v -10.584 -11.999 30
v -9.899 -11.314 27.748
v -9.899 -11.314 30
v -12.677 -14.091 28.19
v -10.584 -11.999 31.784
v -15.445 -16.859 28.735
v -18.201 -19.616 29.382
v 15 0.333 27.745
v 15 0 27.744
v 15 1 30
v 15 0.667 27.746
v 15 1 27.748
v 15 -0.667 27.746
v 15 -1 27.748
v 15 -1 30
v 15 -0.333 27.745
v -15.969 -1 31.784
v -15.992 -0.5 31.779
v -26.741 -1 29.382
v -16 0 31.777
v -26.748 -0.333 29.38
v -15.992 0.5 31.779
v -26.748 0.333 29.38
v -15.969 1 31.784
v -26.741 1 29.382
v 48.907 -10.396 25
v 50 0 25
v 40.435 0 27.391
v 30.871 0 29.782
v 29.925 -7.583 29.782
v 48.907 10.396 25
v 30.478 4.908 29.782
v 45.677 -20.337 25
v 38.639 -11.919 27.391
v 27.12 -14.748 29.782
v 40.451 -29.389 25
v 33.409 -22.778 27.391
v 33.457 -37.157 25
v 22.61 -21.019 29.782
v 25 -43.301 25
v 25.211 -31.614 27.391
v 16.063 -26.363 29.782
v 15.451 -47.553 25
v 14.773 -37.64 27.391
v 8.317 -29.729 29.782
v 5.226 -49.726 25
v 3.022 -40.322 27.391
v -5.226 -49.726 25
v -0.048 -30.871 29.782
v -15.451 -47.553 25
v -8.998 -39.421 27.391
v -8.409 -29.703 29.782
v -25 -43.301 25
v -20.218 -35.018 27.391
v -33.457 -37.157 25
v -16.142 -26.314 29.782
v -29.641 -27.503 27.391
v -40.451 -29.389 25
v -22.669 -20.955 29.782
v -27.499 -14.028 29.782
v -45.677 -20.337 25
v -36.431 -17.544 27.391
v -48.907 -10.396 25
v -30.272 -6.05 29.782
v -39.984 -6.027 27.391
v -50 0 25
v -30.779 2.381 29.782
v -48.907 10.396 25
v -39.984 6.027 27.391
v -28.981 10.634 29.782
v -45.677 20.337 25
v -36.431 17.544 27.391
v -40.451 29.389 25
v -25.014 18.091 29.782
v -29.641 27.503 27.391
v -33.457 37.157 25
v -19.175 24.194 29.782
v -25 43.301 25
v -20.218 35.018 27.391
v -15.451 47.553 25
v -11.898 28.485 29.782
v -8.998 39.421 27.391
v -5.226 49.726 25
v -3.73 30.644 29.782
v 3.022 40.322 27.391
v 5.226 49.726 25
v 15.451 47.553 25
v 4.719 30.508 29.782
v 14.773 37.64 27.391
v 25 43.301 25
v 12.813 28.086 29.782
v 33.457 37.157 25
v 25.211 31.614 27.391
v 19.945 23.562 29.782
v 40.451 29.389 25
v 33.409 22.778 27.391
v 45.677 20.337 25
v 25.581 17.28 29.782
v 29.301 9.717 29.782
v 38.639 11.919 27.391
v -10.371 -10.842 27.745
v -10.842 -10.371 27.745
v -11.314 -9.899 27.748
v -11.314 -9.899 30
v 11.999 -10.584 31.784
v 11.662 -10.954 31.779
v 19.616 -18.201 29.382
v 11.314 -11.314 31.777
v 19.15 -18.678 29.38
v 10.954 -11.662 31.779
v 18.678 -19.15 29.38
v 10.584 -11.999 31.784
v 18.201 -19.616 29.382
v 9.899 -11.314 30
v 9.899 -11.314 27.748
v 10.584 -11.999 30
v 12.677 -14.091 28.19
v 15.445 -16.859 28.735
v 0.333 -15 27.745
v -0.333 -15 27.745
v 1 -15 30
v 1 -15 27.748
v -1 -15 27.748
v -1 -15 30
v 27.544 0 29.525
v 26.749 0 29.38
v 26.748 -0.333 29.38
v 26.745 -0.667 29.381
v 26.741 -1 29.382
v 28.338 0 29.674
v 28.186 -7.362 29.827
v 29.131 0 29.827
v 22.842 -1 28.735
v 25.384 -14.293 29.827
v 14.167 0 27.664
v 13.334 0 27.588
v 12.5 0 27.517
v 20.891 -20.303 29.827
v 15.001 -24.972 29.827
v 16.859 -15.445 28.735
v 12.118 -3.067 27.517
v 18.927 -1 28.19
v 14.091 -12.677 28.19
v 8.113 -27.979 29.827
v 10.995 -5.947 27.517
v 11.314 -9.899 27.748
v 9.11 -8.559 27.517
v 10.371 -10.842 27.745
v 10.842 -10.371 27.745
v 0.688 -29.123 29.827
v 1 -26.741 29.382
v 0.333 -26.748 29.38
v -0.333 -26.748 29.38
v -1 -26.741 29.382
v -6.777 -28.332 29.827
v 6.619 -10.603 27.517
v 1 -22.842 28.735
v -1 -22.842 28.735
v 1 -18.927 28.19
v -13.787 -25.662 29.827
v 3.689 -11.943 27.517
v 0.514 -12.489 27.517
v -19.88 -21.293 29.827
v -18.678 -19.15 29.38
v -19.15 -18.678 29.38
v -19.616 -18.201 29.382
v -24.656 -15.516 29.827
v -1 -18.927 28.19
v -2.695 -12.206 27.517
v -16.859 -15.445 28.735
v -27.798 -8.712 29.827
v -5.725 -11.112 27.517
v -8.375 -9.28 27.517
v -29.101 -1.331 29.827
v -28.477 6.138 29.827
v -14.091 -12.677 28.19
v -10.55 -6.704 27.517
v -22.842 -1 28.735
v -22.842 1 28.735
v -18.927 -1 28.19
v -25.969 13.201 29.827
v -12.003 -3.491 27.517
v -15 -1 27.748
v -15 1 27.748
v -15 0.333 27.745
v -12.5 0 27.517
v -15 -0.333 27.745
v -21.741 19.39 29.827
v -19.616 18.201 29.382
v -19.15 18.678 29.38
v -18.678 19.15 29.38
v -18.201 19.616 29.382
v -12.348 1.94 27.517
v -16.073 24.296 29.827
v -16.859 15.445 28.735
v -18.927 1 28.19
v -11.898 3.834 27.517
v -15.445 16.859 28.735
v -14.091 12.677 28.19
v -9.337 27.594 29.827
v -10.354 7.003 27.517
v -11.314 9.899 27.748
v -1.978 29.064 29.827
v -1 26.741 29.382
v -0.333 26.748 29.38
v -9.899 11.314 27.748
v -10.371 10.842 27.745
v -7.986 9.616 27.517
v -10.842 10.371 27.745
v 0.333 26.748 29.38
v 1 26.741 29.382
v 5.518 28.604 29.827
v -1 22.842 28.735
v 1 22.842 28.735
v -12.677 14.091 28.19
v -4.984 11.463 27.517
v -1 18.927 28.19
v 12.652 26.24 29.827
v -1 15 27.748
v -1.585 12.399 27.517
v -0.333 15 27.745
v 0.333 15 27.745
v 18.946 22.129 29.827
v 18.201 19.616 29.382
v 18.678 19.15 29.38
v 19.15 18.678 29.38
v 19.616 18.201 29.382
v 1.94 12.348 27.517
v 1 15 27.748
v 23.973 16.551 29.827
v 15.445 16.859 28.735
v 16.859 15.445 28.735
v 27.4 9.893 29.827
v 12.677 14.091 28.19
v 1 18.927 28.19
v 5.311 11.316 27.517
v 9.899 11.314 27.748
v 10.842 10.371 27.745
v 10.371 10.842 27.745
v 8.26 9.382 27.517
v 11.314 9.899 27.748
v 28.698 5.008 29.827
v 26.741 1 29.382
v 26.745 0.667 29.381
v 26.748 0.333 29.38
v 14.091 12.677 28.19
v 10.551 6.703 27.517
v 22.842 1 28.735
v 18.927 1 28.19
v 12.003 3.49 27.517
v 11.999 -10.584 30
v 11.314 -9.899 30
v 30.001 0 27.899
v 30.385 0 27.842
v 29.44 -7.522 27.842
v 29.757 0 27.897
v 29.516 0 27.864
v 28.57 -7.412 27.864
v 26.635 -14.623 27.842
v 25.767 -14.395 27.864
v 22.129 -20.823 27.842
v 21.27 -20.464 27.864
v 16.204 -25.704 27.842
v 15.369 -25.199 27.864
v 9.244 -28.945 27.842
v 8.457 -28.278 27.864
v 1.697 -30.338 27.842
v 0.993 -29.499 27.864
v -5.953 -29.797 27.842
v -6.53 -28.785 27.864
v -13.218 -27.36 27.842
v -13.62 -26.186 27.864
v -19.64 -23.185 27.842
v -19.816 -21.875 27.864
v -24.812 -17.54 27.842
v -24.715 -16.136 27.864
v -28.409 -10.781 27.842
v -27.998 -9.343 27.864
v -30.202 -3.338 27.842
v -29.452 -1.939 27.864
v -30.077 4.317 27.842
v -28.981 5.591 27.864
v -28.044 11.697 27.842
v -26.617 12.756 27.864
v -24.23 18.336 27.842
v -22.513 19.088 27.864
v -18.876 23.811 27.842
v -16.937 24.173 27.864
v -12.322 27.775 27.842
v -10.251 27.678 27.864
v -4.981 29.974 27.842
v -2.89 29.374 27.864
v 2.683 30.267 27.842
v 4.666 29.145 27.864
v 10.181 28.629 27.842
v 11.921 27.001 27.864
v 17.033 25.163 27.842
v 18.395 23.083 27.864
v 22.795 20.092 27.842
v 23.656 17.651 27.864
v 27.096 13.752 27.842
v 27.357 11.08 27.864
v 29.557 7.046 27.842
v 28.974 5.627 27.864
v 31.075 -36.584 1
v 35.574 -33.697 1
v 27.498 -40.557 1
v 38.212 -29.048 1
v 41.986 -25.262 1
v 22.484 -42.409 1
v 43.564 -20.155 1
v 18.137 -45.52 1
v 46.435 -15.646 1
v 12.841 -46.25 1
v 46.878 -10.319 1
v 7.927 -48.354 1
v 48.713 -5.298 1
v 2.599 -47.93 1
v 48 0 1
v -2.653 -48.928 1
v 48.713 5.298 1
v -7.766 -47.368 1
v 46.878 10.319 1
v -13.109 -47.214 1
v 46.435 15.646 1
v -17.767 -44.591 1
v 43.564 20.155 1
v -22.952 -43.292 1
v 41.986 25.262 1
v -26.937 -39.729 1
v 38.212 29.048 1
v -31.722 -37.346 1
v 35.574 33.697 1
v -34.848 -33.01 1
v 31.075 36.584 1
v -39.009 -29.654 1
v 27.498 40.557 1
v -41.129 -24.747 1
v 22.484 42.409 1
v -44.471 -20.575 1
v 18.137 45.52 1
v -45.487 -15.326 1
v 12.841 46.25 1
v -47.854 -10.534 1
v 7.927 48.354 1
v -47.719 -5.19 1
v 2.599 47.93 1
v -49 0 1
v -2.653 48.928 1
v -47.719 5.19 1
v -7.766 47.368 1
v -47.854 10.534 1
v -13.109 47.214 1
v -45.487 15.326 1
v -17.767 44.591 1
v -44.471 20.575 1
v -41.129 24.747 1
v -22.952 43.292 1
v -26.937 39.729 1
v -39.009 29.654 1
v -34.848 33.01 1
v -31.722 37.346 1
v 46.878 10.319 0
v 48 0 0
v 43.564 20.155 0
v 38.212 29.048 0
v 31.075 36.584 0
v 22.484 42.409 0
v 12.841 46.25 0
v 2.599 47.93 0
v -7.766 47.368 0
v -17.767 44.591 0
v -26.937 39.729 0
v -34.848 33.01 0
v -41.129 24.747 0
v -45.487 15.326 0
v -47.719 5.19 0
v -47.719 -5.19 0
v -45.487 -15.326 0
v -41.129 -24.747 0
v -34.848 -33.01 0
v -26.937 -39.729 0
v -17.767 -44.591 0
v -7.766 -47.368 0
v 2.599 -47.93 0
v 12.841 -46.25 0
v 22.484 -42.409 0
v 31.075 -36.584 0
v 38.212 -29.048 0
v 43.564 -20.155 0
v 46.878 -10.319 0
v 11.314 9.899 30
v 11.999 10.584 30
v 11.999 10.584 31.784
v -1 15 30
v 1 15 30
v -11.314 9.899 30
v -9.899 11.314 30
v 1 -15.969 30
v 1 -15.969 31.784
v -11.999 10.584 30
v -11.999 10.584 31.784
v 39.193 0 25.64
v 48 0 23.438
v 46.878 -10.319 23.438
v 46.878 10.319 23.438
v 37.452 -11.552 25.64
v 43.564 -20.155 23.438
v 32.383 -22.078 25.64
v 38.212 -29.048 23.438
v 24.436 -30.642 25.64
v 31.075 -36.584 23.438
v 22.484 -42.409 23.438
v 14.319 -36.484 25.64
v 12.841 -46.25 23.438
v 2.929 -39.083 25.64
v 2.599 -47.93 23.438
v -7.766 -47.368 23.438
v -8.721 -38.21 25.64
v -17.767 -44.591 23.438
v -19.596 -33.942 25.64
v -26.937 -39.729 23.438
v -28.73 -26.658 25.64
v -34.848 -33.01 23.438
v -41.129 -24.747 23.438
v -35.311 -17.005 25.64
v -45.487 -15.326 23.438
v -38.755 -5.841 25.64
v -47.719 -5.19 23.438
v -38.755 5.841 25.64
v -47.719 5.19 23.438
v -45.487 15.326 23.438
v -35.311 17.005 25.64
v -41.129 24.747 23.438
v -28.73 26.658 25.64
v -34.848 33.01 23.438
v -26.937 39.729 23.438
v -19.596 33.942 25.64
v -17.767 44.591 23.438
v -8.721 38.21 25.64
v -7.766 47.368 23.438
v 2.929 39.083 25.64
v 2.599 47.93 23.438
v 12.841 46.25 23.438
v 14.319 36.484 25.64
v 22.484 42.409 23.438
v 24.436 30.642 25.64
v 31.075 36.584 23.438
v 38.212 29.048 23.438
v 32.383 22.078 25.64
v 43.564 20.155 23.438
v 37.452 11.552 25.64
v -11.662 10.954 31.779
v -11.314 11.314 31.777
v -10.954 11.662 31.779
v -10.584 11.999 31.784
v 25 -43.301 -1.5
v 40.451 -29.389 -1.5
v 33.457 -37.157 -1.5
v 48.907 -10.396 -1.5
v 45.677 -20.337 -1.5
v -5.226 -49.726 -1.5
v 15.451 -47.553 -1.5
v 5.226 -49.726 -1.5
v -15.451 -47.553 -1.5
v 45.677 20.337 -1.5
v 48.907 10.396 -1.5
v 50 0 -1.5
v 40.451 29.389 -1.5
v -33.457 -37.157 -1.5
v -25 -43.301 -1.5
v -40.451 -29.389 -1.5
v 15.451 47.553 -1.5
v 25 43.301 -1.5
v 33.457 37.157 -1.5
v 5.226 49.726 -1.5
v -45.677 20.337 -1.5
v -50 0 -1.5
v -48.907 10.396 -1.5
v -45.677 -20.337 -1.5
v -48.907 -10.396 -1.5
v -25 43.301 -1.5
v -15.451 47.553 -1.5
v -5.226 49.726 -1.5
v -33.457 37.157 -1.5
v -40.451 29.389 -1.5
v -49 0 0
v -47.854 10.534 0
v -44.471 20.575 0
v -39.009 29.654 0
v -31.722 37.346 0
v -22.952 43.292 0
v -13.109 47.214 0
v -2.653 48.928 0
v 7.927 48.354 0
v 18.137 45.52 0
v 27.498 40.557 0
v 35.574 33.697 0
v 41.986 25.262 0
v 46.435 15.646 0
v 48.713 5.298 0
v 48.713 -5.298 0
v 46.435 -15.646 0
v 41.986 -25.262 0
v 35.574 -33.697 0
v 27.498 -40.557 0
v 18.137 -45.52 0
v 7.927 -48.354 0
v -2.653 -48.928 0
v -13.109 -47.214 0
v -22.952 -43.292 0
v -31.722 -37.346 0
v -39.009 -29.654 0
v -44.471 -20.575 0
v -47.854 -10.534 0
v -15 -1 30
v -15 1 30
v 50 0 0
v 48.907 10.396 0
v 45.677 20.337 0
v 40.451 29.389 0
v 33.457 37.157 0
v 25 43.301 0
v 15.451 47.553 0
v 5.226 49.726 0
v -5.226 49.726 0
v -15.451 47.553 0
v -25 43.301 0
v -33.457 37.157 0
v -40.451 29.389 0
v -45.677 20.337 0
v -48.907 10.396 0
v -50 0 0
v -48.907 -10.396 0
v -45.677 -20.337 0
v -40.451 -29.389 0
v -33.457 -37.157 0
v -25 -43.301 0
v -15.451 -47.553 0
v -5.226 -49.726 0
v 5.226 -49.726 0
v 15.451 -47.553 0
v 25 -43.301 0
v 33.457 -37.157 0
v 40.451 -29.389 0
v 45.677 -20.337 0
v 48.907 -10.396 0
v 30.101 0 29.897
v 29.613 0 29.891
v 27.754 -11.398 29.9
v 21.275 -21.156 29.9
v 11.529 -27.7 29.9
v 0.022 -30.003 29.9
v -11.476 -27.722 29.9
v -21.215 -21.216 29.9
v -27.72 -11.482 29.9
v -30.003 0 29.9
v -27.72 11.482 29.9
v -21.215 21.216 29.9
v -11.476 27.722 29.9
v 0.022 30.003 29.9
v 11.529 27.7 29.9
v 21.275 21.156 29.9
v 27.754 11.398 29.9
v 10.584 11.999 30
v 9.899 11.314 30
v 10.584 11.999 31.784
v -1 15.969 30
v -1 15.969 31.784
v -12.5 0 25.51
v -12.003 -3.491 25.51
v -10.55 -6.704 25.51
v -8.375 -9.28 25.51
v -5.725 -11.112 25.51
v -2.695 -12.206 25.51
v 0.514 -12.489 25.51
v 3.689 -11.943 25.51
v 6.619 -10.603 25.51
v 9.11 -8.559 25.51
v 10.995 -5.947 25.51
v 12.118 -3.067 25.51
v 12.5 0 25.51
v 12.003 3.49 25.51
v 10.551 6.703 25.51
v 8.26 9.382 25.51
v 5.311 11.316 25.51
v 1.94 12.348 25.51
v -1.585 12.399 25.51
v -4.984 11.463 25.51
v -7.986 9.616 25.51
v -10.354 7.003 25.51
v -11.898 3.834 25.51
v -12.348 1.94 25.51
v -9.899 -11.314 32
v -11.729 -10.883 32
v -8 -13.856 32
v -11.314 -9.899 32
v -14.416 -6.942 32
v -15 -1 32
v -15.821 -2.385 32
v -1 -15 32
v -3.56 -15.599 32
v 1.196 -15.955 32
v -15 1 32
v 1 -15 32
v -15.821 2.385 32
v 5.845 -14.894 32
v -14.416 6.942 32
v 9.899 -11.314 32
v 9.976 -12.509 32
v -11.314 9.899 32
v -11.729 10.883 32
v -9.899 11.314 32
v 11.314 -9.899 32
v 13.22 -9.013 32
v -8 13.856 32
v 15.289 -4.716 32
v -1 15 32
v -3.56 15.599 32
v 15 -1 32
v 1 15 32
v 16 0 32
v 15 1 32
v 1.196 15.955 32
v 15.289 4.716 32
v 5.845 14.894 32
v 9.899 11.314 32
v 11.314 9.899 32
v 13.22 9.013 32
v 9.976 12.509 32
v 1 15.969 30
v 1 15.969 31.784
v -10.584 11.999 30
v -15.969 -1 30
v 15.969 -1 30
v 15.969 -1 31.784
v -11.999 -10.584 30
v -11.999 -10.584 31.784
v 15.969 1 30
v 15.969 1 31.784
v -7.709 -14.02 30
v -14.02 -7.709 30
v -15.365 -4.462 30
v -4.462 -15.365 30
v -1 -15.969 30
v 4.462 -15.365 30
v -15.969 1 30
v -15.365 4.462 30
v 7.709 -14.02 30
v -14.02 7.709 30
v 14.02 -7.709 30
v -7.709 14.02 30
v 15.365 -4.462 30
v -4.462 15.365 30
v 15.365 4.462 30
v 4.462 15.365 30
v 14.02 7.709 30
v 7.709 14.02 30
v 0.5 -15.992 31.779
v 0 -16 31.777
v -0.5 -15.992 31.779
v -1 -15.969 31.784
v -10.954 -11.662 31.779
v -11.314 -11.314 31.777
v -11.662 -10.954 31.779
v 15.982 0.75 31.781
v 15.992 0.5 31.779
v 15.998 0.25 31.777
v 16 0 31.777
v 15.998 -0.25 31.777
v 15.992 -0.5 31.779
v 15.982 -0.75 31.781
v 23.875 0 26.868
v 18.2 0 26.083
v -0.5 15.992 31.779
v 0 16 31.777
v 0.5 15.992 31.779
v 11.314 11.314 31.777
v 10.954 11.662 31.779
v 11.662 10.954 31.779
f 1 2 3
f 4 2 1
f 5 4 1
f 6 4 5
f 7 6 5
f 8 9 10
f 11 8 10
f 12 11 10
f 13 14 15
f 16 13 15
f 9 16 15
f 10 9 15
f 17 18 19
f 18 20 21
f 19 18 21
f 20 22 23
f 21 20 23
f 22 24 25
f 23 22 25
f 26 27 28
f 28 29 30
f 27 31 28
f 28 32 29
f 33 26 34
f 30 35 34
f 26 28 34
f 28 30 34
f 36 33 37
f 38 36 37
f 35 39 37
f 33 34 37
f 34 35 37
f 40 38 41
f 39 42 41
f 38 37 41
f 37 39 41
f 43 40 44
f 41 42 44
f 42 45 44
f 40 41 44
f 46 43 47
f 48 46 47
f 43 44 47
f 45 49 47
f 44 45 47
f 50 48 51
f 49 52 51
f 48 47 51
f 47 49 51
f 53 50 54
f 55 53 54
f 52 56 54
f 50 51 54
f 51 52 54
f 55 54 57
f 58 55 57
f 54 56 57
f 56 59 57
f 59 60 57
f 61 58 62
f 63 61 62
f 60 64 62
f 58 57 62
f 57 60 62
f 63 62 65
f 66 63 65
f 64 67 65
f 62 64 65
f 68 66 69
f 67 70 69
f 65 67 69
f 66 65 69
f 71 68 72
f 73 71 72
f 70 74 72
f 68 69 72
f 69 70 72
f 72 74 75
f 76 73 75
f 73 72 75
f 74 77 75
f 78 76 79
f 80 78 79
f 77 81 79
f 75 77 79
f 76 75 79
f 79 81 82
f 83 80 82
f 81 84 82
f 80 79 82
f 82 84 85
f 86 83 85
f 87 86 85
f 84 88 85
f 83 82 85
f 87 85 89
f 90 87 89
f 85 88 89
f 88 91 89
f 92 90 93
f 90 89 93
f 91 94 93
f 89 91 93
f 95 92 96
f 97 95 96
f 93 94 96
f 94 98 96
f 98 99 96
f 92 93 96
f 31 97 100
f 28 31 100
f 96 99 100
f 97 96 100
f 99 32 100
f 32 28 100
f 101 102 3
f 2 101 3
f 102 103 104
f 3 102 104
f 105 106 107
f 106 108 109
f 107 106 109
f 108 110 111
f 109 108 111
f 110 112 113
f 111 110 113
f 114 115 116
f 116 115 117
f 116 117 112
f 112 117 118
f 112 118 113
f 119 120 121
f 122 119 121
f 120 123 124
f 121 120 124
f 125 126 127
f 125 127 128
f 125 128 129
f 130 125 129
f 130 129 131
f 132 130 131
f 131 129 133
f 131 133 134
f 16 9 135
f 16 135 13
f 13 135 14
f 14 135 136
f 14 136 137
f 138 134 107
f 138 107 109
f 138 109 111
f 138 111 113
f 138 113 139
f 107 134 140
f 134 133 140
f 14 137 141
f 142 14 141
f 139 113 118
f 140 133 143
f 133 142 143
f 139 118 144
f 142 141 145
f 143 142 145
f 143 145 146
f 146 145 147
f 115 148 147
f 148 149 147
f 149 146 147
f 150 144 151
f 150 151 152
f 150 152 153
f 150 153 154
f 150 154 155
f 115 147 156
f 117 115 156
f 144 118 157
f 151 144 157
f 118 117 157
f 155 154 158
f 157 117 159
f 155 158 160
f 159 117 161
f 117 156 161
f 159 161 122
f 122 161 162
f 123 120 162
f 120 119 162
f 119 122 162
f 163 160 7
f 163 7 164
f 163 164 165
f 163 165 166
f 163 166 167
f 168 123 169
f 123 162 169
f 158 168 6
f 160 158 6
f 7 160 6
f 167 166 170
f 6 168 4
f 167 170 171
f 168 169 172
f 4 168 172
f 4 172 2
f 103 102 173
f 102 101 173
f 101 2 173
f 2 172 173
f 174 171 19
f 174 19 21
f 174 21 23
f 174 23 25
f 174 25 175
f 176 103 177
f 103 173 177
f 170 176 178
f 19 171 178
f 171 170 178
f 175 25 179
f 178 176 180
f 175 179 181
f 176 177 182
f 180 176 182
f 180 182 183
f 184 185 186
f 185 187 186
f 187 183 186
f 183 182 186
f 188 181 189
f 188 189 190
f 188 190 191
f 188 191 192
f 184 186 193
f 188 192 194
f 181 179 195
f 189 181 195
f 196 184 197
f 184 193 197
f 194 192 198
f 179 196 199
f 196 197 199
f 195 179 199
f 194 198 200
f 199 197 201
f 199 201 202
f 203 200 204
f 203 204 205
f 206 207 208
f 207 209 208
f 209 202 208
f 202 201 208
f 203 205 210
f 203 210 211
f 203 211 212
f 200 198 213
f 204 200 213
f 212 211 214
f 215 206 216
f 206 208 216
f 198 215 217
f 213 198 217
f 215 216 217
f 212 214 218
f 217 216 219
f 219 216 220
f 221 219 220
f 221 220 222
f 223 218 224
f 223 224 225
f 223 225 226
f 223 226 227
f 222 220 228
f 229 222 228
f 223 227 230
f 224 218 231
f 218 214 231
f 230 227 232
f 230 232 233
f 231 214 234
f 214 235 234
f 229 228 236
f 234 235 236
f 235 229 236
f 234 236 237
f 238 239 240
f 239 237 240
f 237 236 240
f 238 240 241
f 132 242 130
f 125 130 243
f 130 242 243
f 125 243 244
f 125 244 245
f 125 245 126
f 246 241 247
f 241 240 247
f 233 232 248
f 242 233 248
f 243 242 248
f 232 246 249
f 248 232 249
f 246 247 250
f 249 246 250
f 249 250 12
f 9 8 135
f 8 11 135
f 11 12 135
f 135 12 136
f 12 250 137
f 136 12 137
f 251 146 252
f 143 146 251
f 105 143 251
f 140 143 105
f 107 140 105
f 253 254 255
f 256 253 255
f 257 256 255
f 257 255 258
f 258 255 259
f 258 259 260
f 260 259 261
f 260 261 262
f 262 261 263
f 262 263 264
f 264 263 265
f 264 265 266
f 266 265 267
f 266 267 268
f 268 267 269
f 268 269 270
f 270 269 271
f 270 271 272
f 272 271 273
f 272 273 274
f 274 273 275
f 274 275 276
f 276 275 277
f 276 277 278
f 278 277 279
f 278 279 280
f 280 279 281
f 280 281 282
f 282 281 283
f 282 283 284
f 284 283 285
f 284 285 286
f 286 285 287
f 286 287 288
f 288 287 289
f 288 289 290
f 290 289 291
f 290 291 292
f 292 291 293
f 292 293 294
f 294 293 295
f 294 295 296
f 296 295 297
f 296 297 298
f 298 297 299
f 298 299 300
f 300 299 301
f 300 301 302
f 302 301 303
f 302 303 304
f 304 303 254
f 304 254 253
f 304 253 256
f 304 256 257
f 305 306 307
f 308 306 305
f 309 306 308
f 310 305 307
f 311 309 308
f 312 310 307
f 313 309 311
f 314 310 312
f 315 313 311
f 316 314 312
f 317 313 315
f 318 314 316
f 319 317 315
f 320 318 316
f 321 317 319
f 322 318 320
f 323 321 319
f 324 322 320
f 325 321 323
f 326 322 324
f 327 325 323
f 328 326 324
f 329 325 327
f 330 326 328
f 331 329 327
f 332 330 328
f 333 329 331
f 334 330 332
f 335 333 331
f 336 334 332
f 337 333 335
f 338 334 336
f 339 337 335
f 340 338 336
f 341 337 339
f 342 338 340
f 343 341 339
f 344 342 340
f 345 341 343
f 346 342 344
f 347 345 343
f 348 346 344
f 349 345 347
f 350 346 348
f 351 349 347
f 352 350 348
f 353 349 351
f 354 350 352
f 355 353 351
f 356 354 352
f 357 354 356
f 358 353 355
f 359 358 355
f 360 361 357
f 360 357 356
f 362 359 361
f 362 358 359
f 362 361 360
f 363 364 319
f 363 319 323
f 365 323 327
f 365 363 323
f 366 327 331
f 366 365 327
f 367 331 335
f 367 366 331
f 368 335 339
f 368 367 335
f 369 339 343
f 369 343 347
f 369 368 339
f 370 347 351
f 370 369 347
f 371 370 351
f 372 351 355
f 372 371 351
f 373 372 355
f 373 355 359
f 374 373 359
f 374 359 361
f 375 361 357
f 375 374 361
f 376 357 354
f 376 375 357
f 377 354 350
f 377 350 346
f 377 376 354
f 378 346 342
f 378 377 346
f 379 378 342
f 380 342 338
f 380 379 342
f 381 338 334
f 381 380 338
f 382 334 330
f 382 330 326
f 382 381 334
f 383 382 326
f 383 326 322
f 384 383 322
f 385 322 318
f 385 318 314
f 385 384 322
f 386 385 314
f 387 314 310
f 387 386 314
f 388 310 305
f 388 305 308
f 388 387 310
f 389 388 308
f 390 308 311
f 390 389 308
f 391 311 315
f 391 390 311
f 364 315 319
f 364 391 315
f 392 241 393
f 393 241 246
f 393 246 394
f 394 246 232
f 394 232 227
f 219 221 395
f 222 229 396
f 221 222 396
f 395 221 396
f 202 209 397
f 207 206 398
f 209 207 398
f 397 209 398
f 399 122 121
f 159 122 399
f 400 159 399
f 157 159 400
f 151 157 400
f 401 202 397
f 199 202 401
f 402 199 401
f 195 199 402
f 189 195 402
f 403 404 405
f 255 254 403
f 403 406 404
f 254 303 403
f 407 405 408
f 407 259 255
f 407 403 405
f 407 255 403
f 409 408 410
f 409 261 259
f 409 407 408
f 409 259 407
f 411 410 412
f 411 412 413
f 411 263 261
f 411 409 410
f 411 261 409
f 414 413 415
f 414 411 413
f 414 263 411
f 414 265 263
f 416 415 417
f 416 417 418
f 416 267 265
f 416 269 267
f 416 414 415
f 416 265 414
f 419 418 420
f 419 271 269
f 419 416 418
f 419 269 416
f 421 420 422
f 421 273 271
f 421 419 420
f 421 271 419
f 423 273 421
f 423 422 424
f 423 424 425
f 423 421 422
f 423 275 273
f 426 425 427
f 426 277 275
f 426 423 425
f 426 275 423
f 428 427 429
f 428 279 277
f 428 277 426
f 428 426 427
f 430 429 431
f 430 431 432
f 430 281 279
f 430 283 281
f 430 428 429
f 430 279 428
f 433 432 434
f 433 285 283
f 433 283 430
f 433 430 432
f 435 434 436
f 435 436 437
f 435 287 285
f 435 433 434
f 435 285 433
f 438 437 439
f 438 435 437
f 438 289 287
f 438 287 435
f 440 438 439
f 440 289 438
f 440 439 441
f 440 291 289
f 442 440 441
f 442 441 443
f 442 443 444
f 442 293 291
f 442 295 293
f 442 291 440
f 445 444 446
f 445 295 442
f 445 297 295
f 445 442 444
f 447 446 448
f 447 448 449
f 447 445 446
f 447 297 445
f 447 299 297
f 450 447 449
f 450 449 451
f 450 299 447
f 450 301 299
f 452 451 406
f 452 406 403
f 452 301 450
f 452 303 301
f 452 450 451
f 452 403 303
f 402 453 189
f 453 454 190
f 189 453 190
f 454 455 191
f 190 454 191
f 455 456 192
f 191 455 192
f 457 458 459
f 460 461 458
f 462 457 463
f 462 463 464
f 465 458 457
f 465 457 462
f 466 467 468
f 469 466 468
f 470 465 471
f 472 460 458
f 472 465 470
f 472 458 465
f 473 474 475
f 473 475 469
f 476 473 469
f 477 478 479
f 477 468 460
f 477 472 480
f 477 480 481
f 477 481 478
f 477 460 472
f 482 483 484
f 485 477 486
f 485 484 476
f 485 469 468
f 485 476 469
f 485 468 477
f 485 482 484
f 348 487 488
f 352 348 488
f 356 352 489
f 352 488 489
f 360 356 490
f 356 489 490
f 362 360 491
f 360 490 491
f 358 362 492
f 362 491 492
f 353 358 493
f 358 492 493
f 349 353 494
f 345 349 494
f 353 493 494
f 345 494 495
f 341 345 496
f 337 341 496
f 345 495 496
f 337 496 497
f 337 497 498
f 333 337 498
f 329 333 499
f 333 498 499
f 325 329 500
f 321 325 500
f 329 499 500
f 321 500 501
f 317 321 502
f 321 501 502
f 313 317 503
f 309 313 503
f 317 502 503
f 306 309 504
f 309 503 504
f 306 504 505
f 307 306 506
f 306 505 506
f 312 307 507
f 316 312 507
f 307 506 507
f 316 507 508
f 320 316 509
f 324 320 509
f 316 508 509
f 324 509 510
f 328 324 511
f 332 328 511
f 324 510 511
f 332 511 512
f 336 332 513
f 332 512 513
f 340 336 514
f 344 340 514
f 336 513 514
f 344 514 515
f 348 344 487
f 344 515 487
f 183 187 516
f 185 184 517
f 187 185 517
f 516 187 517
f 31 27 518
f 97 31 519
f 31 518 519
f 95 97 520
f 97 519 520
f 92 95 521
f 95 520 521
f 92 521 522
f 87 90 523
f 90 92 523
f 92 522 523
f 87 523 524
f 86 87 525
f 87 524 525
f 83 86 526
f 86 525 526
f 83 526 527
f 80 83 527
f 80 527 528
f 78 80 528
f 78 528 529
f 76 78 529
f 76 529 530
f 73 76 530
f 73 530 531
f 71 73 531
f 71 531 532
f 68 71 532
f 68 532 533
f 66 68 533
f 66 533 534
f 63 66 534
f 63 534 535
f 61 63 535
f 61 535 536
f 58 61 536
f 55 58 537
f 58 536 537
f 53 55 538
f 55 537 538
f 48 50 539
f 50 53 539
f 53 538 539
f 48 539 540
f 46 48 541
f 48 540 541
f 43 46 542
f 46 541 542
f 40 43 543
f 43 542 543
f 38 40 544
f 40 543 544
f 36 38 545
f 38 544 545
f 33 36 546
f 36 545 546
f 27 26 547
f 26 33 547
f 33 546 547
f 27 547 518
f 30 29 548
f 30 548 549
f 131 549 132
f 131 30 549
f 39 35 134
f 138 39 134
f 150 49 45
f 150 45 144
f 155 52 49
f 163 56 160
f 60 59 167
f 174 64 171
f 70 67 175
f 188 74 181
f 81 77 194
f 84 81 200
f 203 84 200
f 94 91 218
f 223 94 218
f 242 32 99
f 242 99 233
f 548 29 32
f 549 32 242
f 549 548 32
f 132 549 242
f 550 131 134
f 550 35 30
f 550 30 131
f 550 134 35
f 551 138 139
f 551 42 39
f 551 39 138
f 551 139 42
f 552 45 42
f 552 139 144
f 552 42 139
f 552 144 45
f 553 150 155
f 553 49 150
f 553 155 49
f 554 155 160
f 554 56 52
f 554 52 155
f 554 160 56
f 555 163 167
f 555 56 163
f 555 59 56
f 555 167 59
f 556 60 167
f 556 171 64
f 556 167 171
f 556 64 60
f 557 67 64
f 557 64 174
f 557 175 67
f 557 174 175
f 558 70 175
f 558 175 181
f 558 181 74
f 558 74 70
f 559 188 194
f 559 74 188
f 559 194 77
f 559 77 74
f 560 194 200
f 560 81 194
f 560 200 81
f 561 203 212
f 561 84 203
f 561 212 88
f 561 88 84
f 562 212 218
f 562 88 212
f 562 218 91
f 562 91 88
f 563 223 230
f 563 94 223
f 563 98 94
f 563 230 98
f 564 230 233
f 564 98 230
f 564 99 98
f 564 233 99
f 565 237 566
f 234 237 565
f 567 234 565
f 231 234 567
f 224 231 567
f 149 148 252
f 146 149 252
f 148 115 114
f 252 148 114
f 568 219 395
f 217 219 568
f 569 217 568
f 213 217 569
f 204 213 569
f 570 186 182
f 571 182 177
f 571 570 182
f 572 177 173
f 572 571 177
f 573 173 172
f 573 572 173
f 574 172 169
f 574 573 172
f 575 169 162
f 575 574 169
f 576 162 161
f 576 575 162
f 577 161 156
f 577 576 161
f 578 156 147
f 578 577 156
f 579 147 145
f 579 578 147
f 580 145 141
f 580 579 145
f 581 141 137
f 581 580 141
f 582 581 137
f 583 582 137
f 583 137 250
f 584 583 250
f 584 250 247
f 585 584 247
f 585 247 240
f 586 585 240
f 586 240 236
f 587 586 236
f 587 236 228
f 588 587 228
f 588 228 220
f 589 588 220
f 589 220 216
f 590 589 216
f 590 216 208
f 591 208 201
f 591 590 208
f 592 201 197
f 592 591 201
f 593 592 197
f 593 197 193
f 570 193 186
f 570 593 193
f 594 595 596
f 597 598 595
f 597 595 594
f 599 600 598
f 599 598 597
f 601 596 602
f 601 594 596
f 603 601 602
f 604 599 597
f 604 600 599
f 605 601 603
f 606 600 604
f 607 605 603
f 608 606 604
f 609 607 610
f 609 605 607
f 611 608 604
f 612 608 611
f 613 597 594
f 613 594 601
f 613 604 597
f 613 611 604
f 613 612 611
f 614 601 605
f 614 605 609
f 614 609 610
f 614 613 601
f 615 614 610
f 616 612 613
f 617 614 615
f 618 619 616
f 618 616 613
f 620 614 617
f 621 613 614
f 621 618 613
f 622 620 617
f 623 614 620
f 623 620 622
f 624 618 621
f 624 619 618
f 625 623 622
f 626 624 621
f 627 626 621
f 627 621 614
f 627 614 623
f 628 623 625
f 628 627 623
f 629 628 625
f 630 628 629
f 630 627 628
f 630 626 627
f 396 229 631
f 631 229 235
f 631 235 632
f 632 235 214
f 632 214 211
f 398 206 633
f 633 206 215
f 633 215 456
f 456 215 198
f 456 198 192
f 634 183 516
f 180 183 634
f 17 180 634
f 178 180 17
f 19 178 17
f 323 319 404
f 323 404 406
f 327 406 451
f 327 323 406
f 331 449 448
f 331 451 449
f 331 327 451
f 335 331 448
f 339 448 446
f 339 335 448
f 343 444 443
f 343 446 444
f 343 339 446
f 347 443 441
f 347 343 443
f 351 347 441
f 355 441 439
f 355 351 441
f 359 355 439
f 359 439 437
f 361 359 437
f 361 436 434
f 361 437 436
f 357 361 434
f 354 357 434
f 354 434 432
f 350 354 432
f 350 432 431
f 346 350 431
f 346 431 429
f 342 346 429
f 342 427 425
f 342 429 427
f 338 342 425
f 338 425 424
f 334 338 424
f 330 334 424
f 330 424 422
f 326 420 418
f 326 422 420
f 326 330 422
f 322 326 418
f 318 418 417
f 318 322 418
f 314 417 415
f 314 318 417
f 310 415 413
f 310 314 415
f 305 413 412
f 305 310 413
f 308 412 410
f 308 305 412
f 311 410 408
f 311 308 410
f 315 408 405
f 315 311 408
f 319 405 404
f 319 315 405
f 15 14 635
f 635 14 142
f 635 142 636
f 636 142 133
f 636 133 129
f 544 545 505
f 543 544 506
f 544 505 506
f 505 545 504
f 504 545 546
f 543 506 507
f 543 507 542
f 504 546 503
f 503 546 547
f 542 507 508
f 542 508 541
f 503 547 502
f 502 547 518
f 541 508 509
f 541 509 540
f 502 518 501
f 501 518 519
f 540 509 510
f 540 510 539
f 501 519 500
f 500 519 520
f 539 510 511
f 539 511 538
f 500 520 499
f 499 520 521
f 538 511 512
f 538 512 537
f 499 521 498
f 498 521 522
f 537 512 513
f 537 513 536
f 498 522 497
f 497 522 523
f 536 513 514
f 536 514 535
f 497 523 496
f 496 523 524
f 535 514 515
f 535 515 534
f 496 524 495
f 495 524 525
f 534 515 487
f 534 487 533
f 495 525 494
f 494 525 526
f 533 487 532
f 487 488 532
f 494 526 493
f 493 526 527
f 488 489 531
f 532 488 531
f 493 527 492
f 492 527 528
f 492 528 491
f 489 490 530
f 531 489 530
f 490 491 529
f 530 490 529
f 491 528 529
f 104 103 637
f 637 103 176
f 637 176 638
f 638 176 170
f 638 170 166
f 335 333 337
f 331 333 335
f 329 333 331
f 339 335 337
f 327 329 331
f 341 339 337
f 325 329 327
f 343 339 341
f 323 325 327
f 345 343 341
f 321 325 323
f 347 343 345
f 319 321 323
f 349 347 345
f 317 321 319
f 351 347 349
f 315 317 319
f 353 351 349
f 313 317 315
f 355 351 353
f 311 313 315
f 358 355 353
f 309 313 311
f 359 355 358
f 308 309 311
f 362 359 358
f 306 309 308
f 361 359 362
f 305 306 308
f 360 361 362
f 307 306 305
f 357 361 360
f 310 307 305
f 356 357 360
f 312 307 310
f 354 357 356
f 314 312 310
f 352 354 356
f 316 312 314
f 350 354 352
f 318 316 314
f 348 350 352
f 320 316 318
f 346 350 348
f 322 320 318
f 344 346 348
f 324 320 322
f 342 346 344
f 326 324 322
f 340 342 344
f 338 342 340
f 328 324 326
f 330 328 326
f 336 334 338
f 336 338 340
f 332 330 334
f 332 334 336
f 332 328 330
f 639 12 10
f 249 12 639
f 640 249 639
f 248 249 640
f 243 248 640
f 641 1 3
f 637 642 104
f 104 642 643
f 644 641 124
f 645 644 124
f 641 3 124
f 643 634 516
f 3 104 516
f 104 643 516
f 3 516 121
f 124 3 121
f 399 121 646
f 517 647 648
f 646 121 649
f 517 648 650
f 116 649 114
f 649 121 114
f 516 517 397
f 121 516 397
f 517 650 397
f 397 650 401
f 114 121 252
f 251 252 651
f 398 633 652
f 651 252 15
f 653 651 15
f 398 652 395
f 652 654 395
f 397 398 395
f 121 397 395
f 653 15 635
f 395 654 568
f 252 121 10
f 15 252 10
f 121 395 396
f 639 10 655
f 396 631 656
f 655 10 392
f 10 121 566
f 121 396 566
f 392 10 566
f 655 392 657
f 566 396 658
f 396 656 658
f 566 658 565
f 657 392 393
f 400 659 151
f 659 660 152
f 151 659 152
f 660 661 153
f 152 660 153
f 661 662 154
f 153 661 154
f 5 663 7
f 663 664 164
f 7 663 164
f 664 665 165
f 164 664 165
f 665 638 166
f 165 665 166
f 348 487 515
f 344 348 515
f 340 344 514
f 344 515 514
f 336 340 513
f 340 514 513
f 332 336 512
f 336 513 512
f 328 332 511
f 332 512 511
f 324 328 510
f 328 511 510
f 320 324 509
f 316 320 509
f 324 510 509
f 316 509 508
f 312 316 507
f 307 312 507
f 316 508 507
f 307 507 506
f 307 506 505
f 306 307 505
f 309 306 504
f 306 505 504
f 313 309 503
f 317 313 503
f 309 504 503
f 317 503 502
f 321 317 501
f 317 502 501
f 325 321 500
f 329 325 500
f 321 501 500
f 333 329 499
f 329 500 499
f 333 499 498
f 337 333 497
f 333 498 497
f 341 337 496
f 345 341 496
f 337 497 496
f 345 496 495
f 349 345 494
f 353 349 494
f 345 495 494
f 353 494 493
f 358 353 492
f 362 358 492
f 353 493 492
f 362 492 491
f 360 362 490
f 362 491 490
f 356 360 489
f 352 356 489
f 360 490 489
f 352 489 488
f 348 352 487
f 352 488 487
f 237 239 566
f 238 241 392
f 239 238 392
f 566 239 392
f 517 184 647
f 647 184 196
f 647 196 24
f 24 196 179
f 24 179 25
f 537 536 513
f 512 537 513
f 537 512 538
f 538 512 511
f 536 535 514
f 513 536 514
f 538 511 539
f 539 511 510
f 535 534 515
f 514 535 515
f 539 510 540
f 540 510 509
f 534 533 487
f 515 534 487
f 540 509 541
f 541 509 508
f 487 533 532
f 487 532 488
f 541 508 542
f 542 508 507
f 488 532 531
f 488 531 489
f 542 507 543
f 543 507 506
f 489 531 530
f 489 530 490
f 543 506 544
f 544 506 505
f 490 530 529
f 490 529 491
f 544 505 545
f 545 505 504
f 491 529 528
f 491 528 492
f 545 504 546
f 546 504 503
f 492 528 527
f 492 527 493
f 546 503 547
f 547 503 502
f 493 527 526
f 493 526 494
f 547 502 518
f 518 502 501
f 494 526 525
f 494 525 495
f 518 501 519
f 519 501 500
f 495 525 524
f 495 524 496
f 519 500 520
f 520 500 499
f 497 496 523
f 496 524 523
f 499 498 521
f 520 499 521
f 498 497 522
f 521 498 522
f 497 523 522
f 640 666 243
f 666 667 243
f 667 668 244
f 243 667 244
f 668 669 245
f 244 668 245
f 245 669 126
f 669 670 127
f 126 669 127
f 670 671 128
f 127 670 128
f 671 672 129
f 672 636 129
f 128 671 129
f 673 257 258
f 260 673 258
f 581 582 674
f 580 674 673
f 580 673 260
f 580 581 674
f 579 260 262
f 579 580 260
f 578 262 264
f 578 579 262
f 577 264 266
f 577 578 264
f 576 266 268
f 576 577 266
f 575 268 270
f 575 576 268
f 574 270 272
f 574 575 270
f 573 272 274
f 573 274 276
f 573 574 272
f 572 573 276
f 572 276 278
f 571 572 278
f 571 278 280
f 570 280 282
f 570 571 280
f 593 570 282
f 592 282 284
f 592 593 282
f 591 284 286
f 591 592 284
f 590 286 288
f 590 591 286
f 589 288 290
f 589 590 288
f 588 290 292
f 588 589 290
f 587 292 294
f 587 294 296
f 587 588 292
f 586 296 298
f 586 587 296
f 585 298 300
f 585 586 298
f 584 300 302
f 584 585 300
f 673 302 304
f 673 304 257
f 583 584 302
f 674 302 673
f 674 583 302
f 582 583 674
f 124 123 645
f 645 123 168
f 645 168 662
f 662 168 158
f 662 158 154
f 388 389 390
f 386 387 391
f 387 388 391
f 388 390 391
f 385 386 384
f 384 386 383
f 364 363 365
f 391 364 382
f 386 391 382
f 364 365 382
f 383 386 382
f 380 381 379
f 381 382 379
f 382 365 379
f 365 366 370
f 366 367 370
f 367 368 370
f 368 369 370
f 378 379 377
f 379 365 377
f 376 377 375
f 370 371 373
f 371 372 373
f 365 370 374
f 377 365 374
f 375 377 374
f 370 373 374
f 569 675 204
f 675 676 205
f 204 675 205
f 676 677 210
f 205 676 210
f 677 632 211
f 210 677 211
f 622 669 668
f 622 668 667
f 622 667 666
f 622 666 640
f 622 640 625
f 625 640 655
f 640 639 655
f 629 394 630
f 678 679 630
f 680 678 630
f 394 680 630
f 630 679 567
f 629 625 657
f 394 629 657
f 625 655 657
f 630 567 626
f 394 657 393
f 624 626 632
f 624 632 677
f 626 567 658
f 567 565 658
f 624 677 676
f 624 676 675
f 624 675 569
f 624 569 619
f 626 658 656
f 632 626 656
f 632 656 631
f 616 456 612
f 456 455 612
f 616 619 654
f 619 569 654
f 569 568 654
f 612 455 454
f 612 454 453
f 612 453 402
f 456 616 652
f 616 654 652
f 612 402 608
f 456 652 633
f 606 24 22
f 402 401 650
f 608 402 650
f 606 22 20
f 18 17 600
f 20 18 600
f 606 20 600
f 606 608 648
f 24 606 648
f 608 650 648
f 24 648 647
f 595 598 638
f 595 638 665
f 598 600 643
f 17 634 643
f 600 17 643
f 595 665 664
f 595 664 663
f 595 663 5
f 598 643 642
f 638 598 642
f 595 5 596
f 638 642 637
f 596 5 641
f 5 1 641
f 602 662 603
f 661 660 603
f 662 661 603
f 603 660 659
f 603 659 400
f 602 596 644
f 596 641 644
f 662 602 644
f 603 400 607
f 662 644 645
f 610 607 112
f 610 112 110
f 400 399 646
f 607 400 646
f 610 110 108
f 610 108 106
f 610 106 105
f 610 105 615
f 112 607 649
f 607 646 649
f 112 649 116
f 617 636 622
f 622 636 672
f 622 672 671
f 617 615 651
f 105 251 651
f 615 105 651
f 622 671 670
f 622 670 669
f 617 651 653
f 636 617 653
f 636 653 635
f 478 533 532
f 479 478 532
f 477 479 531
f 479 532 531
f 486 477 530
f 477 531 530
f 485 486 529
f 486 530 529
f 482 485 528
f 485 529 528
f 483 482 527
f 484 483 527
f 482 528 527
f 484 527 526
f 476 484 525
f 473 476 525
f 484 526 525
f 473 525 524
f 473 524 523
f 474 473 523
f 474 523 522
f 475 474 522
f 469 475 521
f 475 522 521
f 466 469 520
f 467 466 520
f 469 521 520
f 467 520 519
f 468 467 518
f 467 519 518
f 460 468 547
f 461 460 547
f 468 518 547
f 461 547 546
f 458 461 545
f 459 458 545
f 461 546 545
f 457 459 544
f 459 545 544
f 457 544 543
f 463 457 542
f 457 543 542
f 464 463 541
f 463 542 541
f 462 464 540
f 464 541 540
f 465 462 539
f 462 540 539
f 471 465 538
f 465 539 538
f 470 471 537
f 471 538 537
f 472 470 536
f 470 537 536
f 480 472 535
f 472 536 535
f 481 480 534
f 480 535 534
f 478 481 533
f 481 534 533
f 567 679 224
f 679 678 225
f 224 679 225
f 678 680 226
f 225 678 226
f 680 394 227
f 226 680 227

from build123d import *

# Parameters (mm, degrees)
SKETCH1_R           = 50
BOSS_EXTRUDE1_DEPTH = 30
FILLET1_R           = 4
SHELL1_T            = -2
SKETCH3_R           = 12.5
CUT_EXTRUDE1_DEPTH  = 77.773152366
SKETCH4_R           = 15
BOSS_EXTRUDE2_DEPTH = 2
BOSS_EXTRUDE3_DEPTH = 1
CIRPATTERN1_COUNT   = 8
SKETCH7_R           = 49
SKETCH7_R_2         = 48
CUT_EXTRUDE2_DEPTH  = 1
SKETCH8_R           = 50
BOSS_EXTRUDE4_DEPTH = 1.5
SKETCH9_R           = 49
SKETCH9_R_2         = 48
BOSS_EXTRUDE5_DEPTH = 1
MOVE_FACE1_BY       = 1


with BuildPart() as part:
    # Sketch1 → Boss-Extrude1 (new body)
    with BuildSketch(Plane.XY):
        Circle(SKETCH1_R)
    extrude(amount=BOSS_EXTRUDE1_DEPTH)

    # Sketch2 → Cut-Revolve1 (revolve, cut)
    with BuildSketch(Plane(origin=(0, 0, 0), x_dir=(1, 0, 0), z_dir=(0, 1, 0))):
        with BuildLine():
            Line((-50, -25), (-30, -30))
            ThreePointArc((-30, -30), (-15.074813432, -27.751865683), (0, -27))
            Line((0, -27), (0, -49.365581707))
            Line((0, -49.365581707), (-56.685327812, -49.365581707))
            Line((-56.685327812, -49.365581707), (-56.685327812, -25))
            Line((-56.685327812, -25), (-50, -25))
        make_face()
    revolve(axis=Axis((0, 0, 49.365581707), (0, 0, -1)), mode=Mode.SUBTRACT)

    # Fillet1
    fillet1_edges = [part.edges().sort_by_distance(p)[0] for p in [
        (30, 0, 30),
    ]]
    fillet(fillet1_edges, radius=FILLET1_R)

    # Shell1
    shell1_openings = [part.faces().sort_by_distance(p)[0] for p in [
        (0, 0, 0),
    ]]
    offset(amount=SHELL1_T, openings=shell1_openings)

    # Sketch3 → Cut-Extrude1 (cut, through all)
    with BuildSketch(Plane.XY):
        Circle(SKETCH3_R)
    extrude(amount=CUT_EXTRUDE1_DEPTH, mode=Mode.SUBTRACT)

    # Sketch5 → Boss-Extrude3 (add, symmetric)
    with BuildSketch(Plane(origin=(0, 0, 0), x_dir=(0, 0, -1), z_dir=(0, 1, 0))):
        with BuildLine():
            Line((-32, 15), (-29.101204824, 28))
            ThreePointArc((-29.101204824, 28), (-28.031113562, 21.52008862), (-27.241942363, 15))
            Line((-27.241942363, 15), (-32, 15))
        make_face()
    boss_extrude3 = extrude(amount=BOSS_EXTRUDE3_DEPTH, both=True)

    # CirPattern1: Boss-Extrude3 ×8 about axis
    cirpattern1_axis = Axis((0, 0, 32), (0, 0, -1))
    for i in range(1, CIRPATTERN1_COUNT):
        add(boss_extrude3.rotate(cirpattern1_axis, i * 360 / CIRPATTERN1_COUNT))

    # Sketch7 → Cut-Extrude2 (cut)
    with BuildSketch(Plane(origin=(0, 0, 0), x_dir=(-1, 0, 0), z_dir=(0, 0, -1))):
        Circle(SKETCH7_R)
        Circle(SKETCH7_R_2, mode=Mode.SUBTRACT)
    extrude(amount=-CUT_EXTRUDE2_DEPTH, mode=Mode.SUBTRACT)


with BuildPart() as body_2:
    # Sketch4 → Boss-Extrude2 (new body)
    with BuildSketch(Plane.XY.offset(30)):
        Circle(SKETCH4_R)
    extrude(amount=BOSS_EXTRUDE2_DEPTH)

    # Move Face1: a curved face moved outward by 1.0
    add(Solid.thicken(body_2.faces().sort_by_distance((-15, 0, 31))[0], MOVE_FACE1_BY))

    # Combine2: union part
    add(part.part)


with BuildPart() as body_3:
    # Sketch8 → Boss-Extrude4 (new body)
    with BuildSketch(Plane(origin=(0, 0, 0), x_dir=(-1, 0, 0), z_dir=(0, 0, -1))):
        Circle(SKETCH8_R)
    extrude(amount=BOSS_EXTRUDE4_DEPTH)

    # Sketch9 → Boss-Extrude5 (add)
    with BuildSketch(Plane.XY):
        Circle(SKETCH9_R)
        Circle(SKETCH9_R_2, mode=Mode.SUBTRACT)
    extrude(amount=BOSS_EXTRUDE5_DEPTH)


solid = Compound([body_2.part, body_3.part])
